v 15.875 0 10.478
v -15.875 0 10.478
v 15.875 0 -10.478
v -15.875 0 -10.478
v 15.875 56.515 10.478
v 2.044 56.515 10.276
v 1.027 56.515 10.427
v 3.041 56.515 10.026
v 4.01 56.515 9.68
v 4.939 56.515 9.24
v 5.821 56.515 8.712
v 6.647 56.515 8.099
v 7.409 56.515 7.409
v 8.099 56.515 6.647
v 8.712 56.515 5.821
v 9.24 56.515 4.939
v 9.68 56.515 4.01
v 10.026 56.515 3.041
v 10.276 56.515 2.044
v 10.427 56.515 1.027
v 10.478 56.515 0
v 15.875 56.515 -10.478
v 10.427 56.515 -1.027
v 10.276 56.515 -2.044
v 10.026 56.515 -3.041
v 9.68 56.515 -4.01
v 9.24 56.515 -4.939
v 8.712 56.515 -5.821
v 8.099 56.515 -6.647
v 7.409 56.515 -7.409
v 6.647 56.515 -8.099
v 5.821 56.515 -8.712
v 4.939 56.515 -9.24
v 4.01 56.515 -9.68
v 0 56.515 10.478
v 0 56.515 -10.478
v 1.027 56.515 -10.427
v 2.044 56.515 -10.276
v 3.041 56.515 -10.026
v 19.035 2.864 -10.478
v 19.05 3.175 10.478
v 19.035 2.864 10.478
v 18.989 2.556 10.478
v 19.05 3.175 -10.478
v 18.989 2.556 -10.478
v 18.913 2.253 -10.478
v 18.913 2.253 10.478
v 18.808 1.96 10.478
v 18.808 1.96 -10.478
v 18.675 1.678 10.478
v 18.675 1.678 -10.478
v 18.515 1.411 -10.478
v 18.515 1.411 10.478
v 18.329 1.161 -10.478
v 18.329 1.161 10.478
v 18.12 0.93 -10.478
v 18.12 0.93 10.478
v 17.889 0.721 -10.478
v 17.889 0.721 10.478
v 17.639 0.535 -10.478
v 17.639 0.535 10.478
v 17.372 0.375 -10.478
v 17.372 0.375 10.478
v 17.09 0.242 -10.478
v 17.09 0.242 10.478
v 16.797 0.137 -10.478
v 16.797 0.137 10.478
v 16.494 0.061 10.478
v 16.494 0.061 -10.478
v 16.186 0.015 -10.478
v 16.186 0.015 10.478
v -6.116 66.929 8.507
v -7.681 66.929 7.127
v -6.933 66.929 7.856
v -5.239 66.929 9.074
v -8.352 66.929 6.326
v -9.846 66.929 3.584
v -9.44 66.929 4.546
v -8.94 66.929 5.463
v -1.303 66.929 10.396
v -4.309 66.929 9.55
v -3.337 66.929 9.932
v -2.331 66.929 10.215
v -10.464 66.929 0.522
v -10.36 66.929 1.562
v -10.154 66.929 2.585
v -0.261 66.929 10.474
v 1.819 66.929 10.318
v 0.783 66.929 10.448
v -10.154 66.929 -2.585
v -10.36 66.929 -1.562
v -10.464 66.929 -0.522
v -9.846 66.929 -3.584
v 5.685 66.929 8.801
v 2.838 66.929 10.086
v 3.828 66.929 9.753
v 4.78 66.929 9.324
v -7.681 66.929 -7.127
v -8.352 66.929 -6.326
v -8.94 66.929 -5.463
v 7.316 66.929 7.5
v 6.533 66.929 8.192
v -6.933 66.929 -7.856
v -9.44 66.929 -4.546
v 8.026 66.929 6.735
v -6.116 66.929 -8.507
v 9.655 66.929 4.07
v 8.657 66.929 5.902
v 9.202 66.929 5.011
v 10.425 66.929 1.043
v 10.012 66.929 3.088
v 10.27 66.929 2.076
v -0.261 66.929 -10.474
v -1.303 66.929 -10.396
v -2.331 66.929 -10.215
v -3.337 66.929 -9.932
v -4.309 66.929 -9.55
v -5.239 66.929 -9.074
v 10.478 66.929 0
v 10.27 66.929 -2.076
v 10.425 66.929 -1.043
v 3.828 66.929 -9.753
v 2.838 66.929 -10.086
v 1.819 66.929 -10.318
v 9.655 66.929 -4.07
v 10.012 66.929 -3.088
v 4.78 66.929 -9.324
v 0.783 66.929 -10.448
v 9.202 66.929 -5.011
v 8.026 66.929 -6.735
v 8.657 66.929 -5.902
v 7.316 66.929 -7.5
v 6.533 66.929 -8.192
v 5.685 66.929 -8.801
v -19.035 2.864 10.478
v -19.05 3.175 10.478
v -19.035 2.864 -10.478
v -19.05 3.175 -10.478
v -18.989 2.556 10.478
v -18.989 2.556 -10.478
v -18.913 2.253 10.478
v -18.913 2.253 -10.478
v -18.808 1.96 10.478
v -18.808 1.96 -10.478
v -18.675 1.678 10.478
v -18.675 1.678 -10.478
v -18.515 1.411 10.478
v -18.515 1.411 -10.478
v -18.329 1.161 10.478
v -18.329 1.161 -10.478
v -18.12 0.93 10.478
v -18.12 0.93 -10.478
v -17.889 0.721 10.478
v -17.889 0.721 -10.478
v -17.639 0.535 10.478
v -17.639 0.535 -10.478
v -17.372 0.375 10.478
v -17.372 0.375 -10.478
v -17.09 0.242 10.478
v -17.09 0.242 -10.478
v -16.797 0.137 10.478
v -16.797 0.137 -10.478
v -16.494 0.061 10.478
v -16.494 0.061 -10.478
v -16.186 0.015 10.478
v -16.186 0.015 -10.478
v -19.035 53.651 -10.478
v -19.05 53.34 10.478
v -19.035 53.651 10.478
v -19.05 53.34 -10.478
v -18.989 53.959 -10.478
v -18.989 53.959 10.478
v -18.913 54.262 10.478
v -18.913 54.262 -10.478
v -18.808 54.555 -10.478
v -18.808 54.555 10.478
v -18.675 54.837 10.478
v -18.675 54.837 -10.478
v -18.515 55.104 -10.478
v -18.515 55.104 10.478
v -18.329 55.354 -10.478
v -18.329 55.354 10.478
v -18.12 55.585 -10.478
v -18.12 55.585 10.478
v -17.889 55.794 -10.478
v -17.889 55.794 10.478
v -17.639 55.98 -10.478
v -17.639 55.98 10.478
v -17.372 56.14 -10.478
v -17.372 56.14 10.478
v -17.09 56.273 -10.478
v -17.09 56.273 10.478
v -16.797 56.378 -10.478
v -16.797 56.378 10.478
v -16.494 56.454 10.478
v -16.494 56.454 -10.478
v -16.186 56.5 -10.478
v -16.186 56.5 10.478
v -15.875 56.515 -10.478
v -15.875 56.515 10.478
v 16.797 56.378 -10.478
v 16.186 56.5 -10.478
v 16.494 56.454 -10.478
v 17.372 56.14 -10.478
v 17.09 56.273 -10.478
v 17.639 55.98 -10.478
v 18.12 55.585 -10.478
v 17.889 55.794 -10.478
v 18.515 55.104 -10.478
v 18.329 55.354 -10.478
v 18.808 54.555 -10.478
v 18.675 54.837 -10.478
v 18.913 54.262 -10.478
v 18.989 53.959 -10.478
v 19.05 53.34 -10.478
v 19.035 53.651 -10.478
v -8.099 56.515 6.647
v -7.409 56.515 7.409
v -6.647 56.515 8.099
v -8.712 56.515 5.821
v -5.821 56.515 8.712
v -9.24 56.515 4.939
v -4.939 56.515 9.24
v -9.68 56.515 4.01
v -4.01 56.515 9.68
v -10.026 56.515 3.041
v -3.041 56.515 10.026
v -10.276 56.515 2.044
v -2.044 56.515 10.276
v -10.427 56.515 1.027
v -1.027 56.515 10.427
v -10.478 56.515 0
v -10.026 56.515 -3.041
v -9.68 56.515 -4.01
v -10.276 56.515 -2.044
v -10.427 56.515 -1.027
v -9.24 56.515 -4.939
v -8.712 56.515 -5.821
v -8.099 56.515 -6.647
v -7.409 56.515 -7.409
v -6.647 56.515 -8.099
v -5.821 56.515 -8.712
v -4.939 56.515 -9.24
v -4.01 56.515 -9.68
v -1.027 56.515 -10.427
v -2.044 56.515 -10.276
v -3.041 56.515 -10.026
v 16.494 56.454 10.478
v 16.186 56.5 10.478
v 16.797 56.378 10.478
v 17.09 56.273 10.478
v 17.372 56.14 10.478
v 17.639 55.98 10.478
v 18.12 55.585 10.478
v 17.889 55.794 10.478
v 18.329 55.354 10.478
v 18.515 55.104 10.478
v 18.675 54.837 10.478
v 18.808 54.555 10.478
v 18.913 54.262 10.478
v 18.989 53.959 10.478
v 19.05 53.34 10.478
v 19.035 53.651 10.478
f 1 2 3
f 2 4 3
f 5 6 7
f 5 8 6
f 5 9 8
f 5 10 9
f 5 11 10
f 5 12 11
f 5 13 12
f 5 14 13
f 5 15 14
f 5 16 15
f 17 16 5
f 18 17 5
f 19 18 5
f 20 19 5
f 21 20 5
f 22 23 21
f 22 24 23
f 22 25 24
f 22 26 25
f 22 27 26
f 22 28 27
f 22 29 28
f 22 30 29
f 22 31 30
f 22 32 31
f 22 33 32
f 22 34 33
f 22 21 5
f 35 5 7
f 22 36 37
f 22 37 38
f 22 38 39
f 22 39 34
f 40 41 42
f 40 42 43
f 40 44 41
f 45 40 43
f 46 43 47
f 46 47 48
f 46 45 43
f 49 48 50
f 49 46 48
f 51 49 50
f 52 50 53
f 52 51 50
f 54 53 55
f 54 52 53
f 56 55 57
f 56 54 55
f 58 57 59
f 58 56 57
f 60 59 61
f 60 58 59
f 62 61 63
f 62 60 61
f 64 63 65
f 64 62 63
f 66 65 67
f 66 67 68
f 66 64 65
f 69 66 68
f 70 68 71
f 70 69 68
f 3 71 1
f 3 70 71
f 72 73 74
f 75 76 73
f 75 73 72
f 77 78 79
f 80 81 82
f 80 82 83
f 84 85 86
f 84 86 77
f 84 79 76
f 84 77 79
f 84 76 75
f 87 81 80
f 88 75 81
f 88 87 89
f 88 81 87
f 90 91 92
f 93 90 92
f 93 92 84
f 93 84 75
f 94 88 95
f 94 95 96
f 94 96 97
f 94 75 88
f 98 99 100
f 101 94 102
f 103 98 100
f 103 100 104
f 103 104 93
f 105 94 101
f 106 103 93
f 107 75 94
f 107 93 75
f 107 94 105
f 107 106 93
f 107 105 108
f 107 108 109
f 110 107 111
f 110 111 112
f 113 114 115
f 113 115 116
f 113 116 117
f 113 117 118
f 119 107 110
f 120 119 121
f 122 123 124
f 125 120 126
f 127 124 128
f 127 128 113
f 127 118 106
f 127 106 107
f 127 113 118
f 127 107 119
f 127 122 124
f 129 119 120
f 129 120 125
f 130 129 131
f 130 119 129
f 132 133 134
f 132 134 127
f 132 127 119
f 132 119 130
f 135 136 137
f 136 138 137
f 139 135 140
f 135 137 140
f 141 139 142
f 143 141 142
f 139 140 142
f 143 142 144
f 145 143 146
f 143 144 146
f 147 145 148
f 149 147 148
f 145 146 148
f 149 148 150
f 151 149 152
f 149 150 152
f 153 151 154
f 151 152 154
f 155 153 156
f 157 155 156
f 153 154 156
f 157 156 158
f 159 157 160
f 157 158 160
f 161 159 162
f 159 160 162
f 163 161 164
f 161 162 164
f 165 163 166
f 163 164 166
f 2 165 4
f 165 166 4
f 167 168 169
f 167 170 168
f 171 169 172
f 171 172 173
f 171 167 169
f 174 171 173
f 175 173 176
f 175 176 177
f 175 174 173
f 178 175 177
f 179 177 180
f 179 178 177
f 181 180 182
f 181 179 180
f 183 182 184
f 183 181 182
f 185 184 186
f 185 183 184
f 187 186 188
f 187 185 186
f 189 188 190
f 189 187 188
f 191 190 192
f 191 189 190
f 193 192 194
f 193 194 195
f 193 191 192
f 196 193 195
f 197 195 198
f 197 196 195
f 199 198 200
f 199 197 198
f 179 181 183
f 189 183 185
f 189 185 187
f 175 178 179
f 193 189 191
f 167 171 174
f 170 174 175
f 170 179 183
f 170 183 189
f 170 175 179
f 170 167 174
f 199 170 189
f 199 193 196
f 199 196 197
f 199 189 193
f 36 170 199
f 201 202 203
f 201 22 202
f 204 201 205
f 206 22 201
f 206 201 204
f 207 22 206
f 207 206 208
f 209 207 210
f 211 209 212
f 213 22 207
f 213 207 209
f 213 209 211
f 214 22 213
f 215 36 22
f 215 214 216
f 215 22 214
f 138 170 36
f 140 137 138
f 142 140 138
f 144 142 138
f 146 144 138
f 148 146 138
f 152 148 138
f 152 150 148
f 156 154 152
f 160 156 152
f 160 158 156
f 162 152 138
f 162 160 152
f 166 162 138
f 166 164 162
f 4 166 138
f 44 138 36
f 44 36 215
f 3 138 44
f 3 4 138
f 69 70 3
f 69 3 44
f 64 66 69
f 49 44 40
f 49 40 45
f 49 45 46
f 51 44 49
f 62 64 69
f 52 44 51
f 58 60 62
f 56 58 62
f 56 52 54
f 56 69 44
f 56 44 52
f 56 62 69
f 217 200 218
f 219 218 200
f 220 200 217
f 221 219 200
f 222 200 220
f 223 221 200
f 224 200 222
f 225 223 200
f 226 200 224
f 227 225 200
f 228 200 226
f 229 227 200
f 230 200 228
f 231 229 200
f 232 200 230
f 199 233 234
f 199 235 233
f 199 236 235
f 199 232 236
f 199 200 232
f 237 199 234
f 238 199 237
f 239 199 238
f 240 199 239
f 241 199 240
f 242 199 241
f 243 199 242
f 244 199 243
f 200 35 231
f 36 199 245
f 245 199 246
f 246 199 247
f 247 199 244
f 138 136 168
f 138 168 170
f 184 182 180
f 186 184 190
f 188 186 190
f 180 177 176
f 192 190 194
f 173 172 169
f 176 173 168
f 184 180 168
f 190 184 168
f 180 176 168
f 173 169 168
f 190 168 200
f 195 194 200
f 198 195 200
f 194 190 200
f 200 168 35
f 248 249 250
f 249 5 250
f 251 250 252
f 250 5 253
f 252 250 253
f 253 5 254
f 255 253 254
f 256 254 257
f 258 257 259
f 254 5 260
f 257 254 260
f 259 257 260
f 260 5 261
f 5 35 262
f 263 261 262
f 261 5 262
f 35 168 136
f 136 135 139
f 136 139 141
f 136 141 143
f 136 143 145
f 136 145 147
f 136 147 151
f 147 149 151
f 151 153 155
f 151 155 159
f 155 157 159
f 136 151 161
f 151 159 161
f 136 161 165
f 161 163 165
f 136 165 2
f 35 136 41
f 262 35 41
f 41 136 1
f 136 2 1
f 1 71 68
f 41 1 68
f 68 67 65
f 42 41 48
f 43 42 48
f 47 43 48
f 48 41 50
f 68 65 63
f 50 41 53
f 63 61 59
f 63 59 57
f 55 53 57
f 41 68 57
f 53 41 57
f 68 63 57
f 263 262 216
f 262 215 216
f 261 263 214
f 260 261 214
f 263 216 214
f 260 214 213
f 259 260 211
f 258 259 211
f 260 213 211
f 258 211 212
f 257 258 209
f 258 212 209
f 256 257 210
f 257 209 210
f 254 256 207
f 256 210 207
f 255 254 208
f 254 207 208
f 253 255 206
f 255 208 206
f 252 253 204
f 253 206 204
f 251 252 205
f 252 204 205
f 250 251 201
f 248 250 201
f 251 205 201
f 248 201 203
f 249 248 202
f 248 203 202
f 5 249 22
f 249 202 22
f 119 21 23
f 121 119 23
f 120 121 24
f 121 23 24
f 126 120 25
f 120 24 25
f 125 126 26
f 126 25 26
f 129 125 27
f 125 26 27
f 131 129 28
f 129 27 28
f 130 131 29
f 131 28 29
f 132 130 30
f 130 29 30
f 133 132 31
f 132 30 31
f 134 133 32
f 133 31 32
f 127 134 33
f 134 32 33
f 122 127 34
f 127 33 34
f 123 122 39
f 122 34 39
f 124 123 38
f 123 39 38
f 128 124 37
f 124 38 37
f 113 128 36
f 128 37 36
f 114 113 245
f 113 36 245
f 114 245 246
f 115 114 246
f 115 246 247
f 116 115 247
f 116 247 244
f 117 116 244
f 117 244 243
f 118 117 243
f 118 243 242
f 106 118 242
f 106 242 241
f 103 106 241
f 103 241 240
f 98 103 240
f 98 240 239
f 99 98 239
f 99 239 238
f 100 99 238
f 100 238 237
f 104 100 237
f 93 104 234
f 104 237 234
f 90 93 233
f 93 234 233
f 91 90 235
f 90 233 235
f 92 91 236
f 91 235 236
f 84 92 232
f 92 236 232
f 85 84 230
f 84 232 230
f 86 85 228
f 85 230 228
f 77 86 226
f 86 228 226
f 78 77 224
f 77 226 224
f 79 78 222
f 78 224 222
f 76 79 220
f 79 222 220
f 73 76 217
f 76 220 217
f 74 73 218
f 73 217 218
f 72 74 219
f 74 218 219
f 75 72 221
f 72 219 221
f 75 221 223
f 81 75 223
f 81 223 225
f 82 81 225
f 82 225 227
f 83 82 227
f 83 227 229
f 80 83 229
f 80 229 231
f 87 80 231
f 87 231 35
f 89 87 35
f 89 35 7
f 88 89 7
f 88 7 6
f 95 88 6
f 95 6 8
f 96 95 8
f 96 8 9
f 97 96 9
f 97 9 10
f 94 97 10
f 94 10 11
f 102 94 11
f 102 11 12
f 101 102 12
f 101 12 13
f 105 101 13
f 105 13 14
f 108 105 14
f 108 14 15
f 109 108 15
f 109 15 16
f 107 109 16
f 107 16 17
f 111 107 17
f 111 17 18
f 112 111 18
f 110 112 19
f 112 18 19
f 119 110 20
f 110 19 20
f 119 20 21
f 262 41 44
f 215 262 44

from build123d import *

# Parameters (mm, degrees)
SKETCH1_W           = 38.1
SKETCH1_H           = 20.955
BOSS_EXTRUDE1_DEPTH = 56.515
FILLET1_R           = 3.175
SKETCH2_R           = 10.4775
BOSS_EXTRUDE2_DEPTH = 10.414


with BuildPart() as part:
    # Sketch1 → Boss-Extrude1 (new body)
    with BuildSketch(Plane(origin=(0, 0, 0), x_dir=(1, 0, 0), z_dir=(0, 1, 0))):
        Rectangle(SKETCH1_W, SKETCH1_H)
    extrude(amount=BOSS_EXTRUDE1_DEPTH)

    # Fillet1
    fillet1_edges = [part.edges().sort_by_distance(p)[0] for p in [
        (-19.05, 56.515, 0),
        (19.05, 56.515, 0),
        (-19.05, 0, 0),
        (19.05, 0, 0),
    ]]
    fillet(fillet1_edges, radius=FILLET1_R)

    # Sketch2 → Boss-Extrude2 (add)
    with BuildSketch(Plane(origin=(0, 56.515, 0), x_dir=(1, 0, 0), z_dir=(0, 1, 0))):
        Circle(SKETCH2_R)
    extrude(amount=BOSS_EXTRUDE2_DEPTH)


solid = part.part
